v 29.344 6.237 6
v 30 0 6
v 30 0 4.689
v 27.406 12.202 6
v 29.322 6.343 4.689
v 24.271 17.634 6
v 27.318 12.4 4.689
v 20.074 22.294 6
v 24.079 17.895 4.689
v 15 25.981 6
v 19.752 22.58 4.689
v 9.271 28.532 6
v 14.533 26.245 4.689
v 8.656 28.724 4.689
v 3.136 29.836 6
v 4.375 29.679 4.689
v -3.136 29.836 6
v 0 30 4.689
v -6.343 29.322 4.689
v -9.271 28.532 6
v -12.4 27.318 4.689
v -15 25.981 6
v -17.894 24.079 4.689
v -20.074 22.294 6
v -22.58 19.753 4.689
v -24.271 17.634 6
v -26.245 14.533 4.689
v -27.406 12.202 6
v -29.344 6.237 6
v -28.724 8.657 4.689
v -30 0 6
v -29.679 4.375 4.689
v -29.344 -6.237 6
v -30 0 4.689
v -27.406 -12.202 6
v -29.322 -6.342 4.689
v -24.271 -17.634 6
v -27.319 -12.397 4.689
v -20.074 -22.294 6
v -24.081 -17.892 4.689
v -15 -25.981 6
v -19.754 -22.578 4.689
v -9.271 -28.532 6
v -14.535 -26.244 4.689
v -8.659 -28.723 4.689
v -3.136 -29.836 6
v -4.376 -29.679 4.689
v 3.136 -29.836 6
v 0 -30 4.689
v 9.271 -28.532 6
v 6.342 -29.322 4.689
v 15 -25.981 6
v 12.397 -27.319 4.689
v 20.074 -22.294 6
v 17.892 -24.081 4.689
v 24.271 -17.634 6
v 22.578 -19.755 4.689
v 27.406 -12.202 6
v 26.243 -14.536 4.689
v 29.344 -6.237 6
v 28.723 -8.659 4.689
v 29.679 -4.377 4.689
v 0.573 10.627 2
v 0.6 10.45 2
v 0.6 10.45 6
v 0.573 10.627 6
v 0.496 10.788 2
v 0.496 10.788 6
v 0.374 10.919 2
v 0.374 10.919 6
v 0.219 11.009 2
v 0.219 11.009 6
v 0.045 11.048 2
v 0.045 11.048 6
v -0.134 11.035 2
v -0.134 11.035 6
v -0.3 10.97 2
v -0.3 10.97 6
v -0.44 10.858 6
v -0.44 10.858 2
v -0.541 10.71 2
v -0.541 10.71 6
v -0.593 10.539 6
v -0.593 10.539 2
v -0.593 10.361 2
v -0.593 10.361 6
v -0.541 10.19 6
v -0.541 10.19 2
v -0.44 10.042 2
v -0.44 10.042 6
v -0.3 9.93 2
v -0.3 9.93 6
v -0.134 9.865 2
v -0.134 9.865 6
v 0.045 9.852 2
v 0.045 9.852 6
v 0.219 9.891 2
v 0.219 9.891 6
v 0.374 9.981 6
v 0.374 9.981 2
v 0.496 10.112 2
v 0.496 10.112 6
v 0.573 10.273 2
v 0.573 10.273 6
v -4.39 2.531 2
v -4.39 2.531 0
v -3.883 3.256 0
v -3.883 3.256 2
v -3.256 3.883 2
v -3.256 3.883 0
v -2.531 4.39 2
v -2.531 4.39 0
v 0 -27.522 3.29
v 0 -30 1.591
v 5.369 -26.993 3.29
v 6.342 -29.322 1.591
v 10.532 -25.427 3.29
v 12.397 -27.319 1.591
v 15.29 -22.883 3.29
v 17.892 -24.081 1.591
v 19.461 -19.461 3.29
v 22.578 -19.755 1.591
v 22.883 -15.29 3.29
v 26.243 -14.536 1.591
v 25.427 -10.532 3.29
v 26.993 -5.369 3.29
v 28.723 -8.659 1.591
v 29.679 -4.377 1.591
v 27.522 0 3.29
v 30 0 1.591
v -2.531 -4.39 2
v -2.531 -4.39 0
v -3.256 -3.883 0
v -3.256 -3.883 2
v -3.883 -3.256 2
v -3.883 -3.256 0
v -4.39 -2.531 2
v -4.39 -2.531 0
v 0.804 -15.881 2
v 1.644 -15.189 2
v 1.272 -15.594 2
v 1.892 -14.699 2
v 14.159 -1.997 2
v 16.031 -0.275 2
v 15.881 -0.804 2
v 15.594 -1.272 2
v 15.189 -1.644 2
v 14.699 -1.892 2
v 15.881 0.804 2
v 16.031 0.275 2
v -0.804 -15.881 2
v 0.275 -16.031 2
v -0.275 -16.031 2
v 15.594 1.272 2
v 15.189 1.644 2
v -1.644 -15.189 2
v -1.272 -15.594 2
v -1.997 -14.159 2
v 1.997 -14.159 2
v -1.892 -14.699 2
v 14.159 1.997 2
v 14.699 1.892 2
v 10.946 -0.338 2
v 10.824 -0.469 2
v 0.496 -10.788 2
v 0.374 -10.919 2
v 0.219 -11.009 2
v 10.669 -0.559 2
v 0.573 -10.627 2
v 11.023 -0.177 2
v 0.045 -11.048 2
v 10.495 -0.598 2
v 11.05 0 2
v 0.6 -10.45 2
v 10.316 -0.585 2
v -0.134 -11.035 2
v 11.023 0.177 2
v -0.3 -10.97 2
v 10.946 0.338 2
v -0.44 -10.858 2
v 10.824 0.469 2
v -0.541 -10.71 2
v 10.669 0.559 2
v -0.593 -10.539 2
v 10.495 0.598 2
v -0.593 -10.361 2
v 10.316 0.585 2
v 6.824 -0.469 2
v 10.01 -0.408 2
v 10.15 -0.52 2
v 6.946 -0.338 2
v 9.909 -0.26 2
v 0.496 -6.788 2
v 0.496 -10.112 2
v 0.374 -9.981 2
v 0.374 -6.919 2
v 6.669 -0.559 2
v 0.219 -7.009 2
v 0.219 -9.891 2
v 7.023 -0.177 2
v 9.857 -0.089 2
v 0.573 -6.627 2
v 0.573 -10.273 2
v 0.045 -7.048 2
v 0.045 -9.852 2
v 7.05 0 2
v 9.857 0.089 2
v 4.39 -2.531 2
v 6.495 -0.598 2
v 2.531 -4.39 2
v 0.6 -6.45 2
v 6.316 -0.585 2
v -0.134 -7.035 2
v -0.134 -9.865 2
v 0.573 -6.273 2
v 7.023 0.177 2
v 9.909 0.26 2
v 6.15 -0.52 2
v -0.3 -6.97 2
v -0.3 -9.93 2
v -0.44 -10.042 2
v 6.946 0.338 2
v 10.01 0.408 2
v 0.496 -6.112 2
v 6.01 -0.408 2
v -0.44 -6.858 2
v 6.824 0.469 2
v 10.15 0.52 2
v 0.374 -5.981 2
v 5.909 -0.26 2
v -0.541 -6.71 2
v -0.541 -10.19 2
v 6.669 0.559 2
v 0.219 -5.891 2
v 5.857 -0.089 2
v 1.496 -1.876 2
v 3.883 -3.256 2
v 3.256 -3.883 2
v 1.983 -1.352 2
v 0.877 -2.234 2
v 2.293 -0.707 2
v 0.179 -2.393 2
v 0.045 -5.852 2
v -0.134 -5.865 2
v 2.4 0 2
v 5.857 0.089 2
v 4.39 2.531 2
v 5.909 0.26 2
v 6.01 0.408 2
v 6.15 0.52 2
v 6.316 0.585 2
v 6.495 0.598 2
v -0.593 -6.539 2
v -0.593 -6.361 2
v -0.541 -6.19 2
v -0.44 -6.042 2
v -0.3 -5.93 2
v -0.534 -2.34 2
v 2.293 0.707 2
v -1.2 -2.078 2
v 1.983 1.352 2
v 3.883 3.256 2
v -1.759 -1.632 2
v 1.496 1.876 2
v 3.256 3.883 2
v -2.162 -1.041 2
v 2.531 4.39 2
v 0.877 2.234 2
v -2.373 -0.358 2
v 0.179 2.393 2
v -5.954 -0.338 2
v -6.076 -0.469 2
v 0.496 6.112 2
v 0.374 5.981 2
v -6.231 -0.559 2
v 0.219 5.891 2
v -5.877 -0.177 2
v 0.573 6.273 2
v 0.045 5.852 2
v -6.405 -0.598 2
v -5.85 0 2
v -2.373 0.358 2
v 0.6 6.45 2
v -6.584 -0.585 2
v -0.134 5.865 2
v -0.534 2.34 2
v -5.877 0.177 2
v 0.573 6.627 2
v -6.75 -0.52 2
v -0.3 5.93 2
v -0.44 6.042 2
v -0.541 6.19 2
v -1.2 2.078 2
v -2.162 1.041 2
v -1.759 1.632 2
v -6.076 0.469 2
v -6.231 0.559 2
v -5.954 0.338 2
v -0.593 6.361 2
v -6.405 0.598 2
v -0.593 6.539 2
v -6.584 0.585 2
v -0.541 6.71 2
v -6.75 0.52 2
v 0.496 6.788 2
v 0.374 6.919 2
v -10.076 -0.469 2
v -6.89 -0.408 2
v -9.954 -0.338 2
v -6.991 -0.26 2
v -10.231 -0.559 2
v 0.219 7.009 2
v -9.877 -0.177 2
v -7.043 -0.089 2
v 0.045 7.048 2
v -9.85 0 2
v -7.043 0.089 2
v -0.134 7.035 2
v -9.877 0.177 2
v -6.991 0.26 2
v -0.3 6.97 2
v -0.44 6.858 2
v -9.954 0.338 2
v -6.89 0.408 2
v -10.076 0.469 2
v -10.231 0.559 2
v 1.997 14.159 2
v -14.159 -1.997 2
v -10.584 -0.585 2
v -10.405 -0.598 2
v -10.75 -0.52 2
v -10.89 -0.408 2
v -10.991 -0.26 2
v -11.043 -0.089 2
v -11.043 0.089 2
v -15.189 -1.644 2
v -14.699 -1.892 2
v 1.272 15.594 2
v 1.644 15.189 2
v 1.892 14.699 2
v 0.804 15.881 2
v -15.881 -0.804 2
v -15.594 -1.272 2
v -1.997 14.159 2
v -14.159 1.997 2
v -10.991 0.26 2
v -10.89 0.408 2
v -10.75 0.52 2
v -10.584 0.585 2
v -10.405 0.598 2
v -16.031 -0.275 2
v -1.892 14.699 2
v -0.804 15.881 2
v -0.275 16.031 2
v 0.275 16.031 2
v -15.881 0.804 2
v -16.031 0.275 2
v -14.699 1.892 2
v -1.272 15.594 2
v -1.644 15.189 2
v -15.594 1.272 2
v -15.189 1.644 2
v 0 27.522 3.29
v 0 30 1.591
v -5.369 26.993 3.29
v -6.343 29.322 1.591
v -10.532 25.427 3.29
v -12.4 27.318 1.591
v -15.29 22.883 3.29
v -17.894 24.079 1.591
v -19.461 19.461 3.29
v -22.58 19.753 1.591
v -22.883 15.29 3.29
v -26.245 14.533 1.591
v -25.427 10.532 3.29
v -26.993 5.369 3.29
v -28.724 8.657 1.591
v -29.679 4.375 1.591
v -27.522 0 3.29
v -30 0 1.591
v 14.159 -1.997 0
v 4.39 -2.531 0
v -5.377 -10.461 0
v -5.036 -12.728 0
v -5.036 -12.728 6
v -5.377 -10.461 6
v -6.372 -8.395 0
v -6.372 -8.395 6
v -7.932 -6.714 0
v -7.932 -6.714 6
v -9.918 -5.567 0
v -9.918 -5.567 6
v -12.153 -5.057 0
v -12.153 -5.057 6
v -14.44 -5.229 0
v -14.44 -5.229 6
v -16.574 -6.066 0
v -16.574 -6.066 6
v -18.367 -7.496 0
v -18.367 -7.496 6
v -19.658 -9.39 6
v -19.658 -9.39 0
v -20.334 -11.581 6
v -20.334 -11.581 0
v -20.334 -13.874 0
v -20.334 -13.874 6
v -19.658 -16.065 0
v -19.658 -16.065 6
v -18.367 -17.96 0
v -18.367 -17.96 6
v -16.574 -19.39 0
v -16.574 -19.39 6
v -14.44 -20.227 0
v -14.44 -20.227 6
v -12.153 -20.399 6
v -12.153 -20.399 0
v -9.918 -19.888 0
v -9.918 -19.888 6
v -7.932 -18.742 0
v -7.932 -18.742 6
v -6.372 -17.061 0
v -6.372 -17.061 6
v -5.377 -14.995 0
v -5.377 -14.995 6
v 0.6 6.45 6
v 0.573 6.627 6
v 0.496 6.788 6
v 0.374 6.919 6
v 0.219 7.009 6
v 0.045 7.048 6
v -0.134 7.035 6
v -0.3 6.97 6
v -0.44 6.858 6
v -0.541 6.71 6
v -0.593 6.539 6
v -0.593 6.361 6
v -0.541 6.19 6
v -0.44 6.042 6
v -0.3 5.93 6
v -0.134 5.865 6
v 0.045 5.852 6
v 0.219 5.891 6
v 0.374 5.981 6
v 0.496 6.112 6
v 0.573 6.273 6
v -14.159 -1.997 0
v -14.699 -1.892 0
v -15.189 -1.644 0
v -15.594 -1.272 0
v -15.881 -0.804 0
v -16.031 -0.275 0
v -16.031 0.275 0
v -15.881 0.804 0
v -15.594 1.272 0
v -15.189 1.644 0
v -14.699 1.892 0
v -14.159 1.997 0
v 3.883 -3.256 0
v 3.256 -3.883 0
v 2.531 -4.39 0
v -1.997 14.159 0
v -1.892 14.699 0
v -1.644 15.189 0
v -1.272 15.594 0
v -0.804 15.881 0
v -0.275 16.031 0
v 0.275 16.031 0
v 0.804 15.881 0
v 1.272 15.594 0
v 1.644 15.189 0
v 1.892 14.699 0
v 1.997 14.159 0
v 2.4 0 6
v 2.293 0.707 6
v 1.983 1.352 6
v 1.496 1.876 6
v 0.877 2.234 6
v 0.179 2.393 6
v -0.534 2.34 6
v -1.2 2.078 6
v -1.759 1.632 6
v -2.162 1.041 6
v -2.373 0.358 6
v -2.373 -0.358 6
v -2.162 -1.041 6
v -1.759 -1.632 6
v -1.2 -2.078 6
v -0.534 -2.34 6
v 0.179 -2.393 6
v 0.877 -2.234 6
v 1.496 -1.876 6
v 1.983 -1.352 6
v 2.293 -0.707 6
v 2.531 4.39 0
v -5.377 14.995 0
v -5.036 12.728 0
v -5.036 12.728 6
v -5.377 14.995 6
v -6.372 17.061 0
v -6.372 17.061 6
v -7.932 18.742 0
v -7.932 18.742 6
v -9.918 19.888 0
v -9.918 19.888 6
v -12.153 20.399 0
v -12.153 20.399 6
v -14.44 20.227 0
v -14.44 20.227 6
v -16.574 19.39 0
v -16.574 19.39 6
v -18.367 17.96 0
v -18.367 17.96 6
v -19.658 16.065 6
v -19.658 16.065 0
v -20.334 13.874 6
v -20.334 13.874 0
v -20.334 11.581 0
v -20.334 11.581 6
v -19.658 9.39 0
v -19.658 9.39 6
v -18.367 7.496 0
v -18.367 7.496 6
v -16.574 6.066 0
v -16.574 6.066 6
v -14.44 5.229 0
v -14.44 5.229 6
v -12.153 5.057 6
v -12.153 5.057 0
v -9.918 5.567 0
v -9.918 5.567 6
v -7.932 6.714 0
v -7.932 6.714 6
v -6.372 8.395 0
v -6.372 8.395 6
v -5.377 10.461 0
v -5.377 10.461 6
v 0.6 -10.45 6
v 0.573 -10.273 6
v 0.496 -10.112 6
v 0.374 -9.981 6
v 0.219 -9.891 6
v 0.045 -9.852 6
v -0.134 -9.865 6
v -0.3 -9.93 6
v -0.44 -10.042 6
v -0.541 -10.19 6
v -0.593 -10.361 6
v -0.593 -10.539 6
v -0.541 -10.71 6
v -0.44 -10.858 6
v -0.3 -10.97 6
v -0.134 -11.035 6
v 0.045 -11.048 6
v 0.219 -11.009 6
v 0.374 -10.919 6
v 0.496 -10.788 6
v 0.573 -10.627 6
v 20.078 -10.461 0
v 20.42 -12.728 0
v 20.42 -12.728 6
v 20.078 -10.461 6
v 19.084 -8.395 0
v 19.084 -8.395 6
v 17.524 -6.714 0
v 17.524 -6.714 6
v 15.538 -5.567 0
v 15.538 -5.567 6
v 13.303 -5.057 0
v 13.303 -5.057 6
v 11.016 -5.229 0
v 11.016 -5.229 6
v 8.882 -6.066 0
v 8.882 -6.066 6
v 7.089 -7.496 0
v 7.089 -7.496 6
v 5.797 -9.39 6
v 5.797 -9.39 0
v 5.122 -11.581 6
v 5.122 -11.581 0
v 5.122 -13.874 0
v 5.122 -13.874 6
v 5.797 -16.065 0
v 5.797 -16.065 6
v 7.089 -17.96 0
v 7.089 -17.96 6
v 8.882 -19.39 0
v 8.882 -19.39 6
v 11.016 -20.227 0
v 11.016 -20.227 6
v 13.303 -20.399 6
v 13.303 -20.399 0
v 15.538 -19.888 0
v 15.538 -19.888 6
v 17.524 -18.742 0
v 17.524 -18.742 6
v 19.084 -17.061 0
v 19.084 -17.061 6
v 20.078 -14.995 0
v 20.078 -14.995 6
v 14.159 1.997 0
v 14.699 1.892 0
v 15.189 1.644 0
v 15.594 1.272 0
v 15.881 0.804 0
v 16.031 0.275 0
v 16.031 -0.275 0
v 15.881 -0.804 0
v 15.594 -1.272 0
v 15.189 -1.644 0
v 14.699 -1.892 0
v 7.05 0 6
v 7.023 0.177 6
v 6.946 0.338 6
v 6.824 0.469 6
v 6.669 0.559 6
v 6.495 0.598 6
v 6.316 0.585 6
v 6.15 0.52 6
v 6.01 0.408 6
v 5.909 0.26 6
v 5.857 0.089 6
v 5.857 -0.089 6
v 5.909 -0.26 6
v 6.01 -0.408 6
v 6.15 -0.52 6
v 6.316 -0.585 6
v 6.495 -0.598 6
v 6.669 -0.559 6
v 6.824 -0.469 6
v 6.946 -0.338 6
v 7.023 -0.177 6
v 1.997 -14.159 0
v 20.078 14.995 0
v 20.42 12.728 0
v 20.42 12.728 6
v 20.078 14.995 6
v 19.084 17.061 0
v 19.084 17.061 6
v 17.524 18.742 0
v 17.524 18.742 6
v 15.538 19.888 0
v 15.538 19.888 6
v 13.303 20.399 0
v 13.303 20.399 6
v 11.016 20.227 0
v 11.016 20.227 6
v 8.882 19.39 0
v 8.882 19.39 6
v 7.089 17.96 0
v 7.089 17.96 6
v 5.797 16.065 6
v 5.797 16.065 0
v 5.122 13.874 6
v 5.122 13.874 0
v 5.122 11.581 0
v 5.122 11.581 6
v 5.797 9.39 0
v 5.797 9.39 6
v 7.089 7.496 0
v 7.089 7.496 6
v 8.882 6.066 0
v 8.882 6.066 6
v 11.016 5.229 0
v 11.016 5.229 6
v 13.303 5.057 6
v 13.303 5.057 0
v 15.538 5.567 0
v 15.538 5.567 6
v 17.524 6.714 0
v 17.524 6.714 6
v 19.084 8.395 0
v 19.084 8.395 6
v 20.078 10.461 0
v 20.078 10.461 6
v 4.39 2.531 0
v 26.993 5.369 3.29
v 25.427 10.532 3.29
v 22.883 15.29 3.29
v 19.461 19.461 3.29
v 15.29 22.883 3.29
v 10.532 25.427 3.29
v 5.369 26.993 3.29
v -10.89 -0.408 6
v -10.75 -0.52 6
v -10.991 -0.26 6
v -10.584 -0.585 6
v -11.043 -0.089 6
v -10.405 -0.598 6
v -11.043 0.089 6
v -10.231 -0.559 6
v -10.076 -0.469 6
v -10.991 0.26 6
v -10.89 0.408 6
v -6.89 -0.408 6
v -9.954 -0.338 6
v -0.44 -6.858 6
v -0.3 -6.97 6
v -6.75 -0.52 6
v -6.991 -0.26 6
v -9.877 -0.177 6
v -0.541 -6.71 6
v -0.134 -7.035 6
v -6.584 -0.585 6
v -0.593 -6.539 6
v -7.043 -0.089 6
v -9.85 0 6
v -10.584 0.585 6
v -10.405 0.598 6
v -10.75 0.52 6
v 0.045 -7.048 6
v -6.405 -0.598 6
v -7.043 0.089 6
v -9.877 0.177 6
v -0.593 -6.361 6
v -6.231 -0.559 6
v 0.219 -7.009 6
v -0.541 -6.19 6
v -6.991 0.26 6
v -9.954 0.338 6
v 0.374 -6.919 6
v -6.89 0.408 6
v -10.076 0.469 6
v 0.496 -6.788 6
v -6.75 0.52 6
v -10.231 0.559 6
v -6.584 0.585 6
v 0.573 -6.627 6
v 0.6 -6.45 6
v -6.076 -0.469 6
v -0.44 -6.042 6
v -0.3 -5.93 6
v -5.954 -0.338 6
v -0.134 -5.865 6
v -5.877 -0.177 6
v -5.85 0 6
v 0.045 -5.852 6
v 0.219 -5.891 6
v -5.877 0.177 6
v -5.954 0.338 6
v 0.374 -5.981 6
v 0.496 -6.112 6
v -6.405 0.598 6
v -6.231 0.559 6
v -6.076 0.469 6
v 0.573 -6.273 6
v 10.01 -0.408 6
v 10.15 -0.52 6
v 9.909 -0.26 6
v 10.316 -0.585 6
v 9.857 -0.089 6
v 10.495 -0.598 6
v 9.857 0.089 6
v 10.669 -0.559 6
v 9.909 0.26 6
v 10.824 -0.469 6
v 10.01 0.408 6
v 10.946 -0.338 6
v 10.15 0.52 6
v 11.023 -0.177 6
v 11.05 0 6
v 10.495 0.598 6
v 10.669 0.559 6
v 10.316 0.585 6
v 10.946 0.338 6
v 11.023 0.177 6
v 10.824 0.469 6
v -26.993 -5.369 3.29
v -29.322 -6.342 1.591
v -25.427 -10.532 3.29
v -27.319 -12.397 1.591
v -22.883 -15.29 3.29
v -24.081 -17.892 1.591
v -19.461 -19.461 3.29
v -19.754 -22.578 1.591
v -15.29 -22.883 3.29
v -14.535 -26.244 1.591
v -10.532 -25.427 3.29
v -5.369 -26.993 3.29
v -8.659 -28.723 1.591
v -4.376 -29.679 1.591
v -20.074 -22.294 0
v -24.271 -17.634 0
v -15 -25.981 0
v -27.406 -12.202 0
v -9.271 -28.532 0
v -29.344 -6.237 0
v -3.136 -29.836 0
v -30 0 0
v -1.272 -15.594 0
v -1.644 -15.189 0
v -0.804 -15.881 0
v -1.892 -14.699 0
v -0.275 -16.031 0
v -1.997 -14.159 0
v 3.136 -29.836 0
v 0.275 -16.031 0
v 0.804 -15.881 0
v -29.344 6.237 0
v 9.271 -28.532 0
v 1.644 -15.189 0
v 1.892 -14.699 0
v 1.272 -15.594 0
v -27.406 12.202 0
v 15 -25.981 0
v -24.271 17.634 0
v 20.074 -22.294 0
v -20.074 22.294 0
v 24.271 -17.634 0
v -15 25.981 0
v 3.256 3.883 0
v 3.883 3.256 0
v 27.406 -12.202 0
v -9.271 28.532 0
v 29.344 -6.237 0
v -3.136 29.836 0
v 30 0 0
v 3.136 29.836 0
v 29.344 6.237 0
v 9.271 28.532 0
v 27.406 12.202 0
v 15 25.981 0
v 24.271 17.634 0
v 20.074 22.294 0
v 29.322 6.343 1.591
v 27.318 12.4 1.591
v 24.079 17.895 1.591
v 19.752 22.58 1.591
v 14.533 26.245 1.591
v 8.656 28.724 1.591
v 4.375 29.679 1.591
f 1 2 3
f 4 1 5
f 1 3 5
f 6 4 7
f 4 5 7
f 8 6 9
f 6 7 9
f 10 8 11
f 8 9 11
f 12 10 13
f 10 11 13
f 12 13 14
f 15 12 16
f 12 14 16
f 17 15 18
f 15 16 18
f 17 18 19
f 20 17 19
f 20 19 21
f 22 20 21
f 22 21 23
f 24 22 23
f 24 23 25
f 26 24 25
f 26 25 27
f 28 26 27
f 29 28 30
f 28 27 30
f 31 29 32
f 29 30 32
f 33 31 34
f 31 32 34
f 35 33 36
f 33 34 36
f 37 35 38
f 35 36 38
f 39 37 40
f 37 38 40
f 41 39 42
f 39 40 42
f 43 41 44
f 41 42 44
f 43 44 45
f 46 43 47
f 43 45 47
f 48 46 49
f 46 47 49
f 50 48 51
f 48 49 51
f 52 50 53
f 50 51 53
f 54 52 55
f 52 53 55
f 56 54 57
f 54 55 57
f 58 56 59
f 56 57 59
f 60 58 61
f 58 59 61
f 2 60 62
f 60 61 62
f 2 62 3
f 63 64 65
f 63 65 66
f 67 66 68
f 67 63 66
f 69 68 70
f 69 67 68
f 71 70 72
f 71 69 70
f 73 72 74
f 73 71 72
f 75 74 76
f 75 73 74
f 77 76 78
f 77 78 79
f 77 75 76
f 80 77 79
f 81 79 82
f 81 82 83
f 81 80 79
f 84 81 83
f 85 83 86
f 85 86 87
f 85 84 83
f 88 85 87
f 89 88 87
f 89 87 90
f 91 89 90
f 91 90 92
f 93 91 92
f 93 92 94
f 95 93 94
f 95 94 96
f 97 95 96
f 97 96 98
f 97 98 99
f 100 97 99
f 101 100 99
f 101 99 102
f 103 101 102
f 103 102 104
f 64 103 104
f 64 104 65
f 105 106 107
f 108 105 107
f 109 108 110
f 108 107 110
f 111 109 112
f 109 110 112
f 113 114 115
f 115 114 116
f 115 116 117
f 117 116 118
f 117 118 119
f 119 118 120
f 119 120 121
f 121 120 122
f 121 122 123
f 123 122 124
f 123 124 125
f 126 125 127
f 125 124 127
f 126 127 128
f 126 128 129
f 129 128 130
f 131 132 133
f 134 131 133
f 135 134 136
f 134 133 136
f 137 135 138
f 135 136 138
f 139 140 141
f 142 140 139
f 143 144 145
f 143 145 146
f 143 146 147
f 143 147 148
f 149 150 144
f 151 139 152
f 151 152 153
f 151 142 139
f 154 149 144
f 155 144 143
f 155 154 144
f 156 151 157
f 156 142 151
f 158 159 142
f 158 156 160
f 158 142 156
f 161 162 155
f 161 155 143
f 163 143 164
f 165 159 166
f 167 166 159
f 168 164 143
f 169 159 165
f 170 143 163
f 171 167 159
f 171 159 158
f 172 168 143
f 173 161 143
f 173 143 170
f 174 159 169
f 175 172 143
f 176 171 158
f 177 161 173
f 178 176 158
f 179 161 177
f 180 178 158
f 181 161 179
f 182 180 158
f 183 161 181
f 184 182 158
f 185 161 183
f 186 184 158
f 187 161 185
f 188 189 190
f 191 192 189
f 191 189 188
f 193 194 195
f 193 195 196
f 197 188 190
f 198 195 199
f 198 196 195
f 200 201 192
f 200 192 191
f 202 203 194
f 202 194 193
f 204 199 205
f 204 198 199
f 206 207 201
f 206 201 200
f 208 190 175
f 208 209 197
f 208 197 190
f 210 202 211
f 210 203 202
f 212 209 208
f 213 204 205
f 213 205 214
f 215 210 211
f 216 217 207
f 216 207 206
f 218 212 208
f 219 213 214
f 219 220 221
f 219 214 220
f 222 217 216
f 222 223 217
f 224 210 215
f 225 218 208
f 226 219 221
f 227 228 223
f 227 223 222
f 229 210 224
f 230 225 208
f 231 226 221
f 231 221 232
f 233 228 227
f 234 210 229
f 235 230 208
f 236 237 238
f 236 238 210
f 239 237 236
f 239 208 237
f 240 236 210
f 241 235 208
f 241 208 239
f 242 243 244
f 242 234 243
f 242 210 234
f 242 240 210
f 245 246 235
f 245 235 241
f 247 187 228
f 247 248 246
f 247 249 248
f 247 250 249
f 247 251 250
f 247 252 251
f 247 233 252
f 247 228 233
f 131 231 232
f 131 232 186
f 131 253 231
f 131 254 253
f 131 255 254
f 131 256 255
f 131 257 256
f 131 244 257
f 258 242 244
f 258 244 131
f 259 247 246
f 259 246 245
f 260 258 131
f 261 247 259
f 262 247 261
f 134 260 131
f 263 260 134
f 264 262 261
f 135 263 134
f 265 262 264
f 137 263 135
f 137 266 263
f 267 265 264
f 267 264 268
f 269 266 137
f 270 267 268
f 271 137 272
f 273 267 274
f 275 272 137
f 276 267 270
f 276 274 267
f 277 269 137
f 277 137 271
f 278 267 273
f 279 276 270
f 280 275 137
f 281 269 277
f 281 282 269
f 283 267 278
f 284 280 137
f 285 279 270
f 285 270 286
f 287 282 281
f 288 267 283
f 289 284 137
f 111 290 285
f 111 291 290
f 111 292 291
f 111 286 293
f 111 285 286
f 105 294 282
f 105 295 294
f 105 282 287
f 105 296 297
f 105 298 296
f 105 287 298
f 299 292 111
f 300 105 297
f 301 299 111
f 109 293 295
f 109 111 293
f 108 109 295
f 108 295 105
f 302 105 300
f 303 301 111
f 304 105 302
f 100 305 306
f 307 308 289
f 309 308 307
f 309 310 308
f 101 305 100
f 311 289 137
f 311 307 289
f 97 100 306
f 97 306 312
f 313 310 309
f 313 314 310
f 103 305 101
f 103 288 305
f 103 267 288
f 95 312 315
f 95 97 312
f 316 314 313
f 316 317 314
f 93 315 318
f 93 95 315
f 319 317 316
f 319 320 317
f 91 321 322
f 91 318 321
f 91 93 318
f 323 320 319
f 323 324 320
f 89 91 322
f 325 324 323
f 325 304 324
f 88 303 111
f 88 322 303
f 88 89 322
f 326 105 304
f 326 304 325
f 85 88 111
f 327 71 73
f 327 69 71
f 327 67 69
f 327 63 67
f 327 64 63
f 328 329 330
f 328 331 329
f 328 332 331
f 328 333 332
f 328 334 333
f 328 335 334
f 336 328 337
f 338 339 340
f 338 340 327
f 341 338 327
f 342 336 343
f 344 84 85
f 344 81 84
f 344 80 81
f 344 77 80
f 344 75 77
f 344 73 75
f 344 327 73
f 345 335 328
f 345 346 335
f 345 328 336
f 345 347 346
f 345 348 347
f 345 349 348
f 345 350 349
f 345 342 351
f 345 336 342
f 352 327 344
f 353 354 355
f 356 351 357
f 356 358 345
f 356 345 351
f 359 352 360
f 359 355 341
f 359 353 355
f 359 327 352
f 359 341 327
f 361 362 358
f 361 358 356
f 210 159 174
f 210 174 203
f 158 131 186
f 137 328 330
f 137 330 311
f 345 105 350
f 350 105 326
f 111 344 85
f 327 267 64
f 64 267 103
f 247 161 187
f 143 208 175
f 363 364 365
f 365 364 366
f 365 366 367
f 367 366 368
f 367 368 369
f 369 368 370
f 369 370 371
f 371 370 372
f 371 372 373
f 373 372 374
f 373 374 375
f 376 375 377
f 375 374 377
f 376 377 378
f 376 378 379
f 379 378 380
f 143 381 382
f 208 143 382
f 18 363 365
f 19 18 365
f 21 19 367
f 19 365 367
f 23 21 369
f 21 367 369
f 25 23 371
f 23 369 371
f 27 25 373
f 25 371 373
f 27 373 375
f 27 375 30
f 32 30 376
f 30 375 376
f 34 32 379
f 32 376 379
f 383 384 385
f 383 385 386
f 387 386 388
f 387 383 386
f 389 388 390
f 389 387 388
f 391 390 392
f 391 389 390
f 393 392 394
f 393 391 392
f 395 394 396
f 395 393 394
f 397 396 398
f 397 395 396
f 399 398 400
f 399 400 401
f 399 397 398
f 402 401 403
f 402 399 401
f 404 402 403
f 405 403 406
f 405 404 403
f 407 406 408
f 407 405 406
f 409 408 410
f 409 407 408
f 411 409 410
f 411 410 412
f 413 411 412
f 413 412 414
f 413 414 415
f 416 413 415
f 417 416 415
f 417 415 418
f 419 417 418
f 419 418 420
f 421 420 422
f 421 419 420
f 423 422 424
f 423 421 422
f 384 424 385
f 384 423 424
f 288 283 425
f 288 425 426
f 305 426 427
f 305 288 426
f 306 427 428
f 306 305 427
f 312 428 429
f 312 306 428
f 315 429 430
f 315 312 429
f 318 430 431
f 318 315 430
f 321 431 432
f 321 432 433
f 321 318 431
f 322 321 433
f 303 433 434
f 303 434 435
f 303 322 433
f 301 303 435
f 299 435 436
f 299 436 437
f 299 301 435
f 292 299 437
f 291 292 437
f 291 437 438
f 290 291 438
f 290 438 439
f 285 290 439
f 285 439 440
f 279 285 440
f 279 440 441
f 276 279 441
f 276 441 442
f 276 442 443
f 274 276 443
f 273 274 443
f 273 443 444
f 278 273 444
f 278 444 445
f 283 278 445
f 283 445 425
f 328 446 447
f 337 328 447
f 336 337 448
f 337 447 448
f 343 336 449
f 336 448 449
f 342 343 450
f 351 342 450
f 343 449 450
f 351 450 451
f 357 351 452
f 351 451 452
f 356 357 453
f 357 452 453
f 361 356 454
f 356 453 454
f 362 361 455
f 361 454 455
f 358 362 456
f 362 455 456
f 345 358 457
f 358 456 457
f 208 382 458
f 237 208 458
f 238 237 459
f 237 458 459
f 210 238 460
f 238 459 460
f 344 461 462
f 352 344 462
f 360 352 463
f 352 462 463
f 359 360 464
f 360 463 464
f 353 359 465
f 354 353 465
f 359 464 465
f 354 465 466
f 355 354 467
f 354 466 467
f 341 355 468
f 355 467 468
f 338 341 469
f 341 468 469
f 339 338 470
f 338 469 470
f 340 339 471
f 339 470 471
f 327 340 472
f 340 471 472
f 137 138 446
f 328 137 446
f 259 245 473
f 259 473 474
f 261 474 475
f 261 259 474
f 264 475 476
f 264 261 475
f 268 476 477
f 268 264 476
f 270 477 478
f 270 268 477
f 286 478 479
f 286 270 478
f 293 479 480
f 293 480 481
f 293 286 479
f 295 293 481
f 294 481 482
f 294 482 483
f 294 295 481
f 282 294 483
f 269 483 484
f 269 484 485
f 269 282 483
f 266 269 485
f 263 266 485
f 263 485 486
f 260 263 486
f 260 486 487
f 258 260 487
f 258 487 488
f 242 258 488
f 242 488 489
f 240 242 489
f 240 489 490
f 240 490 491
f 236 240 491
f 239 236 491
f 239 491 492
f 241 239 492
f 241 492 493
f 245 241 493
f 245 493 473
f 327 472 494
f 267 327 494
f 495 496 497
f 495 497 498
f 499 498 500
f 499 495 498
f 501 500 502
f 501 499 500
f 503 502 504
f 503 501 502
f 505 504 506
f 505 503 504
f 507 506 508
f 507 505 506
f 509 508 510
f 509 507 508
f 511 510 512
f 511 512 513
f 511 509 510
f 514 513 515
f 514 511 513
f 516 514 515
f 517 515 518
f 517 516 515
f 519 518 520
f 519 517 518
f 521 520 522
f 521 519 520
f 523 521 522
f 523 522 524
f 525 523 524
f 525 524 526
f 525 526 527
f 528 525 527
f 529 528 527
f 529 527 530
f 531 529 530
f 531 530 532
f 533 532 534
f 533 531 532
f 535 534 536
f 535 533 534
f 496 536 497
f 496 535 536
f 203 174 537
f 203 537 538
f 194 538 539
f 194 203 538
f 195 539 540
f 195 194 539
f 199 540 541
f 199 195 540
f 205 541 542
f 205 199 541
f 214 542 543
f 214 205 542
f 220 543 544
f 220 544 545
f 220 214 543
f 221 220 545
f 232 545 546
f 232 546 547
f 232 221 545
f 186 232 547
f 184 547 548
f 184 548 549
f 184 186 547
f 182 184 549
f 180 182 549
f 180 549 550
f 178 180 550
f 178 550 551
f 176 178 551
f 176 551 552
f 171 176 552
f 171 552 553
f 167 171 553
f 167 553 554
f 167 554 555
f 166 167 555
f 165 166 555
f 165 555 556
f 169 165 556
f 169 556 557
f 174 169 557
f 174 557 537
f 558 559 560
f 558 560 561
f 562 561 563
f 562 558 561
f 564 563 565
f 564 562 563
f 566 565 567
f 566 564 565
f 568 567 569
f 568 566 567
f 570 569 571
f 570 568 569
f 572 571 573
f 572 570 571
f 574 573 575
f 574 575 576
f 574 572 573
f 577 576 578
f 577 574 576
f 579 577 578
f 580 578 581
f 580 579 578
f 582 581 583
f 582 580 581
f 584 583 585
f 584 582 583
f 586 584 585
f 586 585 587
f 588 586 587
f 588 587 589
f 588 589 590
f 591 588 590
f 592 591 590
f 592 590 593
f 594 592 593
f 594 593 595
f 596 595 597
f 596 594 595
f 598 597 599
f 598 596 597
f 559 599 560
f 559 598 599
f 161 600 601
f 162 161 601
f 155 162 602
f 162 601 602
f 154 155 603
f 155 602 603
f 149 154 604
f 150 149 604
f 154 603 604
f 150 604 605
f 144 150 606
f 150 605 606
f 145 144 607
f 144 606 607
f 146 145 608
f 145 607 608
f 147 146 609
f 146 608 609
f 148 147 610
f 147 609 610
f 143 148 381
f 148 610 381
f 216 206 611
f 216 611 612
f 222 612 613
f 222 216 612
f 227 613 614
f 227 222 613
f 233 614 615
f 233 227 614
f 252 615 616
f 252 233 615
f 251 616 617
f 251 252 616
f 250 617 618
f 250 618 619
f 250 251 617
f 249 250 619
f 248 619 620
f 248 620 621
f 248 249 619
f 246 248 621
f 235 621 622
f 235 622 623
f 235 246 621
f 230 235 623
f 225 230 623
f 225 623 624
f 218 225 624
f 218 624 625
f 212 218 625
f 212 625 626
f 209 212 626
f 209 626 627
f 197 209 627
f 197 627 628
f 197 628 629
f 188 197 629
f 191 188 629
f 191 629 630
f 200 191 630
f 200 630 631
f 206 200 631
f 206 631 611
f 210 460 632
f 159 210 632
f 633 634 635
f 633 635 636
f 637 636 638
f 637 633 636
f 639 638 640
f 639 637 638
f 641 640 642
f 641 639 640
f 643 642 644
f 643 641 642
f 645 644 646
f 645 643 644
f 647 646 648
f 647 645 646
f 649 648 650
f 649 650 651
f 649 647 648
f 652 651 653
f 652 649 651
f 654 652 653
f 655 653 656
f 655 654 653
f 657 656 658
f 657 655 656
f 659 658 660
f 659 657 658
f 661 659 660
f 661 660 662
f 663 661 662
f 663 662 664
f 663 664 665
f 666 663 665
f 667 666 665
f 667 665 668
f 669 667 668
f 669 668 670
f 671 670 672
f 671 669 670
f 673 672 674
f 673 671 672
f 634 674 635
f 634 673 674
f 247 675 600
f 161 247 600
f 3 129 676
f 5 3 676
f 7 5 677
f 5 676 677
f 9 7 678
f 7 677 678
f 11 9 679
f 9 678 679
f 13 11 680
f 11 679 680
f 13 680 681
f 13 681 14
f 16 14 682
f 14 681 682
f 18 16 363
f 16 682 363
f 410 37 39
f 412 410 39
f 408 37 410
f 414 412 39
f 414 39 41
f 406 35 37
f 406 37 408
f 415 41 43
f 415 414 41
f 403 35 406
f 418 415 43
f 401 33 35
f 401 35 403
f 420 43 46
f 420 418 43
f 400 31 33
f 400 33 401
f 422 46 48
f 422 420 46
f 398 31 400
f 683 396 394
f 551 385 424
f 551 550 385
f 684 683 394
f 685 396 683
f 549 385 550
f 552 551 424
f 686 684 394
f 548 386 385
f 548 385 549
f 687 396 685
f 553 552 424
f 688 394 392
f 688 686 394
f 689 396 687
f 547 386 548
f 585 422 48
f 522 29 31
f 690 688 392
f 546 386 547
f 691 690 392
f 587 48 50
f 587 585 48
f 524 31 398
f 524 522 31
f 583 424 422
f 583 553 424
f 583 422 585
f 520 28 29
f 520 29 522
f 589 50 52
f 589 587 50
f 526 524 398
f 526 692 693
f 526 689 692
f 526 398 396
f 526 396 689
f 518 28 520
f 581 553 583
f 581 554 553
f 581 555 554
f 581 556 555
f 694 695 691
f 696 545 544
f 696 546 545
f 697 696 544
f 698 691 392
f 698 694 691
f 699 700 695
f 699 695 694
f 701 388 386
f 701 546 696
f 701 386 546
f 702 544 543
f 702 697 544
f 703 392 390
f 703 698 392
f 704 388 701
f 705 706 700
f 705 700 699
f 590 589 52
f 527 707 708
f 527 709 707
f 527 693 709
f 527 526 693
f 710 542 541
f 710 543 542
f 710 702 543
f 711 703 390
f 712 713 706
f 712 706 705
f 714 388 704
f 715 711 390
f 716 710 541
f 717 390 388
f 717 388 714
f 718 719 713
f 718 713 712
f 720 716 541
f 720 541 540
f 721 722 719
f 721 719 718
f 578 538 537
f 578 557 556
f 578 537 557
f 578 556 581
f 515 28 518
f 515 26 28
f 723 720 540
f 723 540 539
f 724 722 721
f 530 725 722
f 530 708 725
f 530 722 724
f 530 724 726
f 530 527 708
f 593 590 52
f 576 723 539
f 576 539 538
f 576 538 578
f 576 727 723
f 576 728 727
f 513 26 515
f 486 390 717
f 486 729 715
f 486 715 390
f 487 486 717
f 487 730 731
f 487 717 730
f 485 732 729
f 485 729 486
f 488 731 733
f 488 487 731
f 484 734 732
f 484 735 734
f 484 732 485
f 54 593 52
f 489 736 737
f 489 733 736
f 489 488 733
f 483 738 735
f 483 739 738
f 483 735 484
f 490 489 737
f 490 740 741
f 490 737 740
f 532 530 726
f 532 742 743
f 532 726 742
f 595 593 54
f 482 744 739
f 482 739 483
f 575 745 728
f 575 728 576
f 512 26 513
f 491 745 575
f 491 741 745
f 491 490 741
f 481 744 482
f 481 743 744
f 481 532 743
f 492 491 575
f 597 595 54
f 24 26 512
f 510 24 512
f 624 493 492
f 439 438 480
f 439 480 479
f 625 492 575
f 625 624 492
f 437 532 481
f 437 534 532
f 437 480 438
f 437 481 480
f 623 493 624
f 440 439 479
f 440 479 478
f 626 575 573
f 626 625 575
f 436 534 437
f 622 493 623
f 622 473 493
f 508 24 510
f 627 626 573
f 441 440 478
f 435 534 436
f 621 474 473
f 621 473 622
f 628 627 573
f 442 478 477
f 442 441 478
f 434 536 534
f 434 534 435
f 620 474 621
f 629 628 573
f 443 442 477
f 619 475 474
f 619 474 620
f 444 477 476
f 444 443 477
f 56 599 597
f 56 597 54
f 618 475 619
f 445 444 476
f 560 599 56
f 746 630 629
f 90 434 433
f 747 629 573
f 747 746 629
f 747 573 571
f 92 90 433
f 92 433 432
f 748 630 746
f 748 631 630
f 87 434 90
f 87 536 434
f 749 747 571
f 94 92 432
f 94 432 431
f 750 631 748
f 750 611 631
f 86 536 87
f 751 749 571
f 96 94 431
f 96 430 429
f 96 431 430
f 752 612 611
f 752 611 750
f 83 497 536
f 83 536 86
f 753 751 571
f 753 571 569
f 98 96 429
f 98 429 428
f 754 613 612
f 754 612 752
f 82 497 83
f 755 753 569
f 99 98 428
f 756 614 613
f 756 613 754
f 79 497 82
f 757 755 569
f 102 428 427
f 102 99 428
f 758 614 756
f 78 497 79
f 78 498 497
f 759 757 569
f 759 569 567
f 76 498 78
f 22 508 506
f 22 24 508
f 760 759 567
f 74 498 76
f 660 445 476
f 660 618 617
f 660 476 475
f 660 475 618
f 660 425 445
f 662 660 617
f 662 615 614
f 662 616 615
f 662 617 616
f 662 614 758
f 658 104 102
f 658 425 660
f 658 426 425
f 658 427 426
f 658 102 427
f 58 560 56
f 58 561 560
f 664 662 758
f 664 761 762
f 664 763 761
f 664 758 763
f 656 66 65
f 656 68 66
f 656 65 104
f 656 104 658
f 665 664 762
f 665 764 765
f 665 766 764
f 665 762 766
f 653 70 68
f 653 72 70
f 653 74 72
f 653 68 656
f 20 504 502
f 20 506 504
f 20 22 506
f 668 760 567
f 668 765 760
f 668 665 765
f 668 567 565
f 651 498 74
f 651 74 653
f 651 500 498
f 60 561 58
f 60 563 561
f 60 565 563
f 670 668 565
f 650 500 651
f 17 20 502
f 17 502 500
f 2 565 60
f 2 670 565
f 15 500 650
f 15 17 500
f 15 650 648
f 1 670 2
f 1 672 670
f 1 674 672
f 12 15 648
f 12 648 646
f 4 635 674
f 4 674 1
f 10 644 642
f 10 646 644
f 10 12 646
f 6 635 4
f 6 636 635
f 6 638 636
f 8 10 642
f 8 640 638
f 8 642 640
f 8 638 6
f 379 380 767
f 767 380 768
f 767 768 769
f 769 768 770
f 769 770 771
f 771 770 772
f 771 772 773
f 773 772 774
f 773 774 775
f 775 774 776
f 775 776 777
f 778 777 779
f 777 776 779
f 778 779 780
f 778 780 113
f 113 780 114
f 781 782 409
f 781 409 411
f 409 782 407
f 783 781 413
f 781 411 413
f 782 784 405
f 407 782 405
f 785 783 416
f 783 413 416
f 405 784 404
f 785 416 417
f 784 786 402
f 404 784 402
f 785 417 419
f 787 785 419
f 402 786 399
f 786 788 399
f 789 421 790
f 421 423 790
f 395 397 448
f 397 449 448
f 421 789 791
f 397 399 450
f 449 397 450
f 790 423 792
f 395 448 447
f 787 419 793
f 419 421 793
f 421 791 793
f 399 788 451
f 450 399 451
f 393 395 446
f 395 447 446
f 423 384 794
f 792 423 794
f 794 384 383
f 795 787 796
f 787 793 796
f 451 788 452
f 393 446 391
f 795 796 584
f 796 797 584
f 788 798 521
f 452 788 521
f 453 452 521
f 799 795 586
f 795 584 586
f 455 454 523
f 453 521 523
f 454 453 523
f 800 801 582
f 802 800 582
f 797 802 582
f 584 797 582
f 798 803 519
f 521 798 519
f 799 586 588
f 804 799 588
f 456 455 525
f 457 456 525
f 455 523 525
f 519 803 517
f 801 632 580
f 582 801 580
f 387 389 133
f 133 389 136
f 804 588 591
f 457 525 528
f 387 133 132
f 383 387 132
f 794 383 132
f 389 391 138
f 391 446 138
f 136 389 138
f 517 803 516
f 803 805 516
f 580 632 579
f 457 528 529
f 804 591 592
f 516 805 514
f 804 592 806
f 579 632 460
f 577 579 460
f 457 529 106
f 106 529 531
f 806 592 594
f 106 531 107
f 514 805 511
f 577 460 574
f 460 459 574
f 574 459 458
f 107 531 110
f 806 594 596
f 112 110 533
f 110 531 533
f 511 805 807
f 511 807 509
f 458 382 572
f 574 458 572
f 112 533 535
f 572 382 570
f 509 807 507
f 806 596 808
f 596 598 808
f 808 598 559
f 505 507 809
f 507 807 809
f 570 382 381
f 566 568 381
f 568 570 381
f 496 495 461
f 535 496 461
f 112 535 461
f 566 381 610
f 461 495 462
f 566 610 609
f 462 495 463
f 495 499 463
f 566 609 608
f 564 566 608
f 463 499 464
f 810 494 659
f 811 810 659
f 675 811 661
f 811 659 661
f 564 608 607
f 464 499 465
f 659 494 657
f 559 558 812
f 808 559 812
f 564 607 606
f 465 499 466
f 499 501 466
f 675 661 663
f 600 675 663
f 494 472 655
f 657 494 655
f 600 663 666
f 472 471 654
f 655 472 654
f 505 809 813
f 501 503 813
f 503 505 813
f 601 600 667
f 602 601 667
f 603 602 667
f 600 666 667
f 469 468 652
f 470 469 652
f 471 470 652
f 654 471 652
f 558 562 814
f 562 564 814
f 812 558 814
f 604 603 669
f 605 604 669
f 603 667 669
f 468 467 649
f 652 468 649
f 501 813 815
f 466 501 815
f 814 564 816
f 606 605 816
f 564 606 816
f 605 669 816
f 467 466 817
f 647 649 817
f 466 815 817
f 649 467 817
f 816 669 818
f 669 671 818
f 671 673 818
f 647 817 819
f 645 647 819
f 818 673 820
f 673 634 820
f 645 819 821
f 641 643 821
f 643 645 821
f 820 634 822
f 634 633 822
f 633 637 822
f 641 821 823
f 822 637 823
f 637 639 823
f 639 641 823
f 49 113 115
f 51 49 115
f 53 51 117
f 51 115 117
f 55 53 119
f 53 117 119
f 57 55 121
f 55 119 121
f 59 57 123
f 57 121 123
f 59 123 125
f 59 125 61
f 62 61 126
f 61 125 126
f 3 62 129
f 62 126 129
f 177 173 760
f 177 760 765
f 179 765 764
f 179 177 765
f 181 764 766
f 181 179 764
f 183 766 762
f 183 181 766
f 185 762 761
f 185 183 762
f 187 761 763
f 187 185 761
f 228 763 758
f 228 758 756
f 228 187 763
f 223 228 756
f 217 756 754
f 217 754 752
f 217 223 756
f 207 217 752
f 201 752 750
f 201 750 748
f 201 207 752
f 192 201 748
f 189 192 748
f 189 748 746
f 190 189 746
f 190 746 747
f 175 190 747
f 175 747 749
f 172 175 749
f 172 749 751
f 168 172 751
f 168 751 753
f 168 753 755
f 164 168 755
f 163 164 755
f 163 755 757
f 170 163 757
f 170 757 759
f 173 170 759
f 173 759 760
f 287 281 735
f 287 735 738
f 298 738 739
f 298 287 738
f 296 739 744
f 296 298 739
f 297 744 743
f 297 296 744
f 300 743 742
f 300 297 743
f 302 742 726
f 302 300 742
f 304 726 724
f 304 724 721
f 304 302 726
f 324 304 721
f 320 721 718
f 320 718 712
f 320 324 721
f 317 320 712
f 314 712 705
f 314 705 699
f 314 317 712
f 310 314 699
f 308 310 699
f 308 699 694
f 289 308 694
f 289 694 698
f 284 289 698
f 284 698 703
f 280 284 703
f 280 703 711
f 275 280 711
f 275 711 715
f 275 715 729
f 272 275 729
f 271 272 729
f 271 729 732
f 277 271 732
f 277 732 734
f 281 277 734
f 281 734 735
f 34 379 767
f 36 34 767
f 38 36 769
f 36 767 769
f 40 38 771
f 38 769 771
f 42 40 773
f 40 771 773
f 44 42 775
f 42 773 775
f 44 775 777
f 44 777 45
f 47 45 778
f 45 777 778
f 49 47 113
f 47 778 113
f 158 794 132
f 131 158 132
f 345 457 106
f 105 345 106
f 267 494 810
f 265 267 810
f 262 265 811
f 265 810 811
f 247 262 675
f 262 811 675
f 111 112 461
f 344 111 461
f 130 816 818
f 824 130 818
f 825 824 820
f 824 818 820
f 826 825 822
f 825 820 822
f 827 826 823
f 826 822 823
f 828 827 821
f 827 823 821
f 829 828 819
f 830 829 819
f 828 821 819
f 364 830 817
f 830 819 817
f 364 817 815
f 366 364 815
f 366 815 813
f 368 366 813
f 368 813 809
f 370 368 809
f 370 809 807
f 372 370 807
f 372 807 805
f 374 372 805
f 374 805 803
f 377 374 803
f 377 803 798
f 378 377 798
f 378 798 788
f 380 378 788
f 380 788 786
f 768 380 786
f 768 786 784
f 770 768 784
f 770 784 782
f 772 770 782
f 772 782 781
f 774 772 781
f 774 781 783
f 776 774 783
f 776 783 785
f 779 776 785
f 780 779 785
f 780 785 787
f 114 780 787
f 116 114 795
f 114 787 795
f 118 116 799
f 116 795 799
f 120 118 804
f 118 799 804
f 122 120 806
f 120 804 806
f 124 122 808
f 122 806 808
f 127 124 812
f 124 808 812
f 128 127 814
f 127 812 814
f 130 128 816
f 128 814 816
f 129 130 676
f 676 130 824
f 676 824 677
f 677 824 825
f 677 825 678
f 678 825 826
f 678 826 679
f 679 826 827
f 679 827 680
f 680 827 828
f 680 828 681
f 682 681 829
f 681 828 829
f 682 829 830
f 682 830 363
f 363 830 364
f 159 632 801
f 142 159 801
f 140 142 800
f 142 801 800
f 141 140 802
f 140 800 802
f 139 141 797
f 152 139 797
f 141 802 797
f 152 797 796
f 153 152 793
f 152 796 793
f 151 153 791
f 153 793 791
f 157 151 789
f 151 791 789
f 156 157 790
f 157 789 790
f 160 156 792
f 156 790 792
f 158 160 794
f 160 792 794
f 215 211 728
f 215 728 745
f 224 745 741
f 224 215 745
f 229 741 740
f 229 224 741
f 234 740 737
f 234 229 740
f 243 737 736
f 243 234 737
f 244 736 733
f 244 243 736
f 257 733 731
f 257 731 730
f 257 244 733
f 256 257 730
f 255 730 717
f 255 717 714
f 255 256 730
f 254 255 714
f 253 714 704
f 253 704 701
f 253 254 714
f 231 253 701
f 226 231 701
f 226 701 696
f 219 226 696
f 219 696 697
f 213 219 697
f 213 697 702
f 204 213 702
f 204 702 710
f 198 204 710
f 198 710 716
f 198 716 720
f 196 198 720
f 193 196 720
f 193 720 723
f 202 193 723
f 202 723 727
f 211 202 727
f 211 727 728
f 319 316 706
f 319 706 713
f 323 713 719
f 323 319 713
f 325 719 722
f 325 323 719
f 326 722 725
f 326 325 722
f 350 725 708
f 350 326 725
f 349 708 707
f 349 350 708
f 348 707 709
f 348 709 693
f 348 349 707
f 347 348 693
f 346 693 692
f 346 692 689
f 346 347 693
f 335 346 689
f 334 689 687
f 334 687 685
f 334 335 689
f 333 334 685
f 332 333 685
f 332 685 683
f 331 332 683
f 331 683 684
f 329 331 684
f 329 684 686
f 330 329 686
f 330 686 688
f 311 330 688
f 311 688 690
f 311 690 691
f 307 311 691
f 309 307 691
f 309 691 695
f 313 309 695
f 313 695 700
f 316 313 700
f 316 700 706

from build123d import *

# Parameters (mm, degrees)
ESQUISSE2_R             = 30
ESQUISSE2_R_2           = 0.6
ESQUISSE2_R_3           = 2.4
ESQUISSE2_R_4           = 7.692251906
BOSS_EXTRU_1_DEPTH      = 6
ENL_V_MAT_EXTRU_1_DEPTH = 2


with BuildPart() as part:
    # Esquisse2 → Boss.-Extru.1 (new body)
    with BuildSketch(Plane.XY):
        Circle(ESQUISSE2_R)
        with Locations((0, 10.45)):
            Circle(ESQUISSE2_R_2, mode=Mode.SUBTRACT)
        with Locations((0, 6.45)):
            Circle(ESQUISSE2_R_2, mode=Mode.SUBTRACT)
        Circle(ESQUISSE2_R_3, mode=Mode.SUBTRACT)
        with Locations((10.45, 0)):
            Circle(ESQUISSE2_R_2, mode=Mode.SUBTRACT)
        with Locations((6.45, 0)):
            Circle(ESQUISSE2_R_2, mode=Mode.SUBTRACT)
        with Locations((0, -10.45)):
            Circle(ESQUISSE2_R_2, mode=Mode.SUBTRACT)
        with Locations((0, -6.45)):
            Circle(ESQUISSE2_R_2, mode=Mode.SUBTRACT)
        with Locations((-10.45, 0)):
            Circle(ESQUISSE2_R_2, mode=Mode.SUBTRACT)
        with Locations((-6.45, 0)):
            Circle(ESQUISSE2_R_2, mode=Mode.SUBTRACT)
        with Locations((-12.727922061, 12.727922061)):
            Circle(ESQUISSE2_R_4, mode=Mode.SUBTRACT)
        with Locations((12.727922061, 12.727922061)):
            Circle(ESQUISSE2_R_4, mode=Mode.SUBTRACT)
        with Locations((12.727922061, -12.727922061)):
            Circle(ESQUISSE2_R_4, mode=Mode.SUBTRACT)
        with Locations((-12.727922061, -12.727922061)):
            Circle(ESQUISSE2_R_4, mode=Mode.SUBTRACT)
    extrude(amount=BOSS_EXTRU_1_DEPTH)

    # Esquisse3 → Enlèv. mat.-Extru.1 (cut)
    with BuildSketch(Plane(origin=(0, 0, 0), x_dir=(-1, 0, 0), z_dir=(0, 0, -1))):
        with BuildLine():
            Line((-2.530820261, -4.390158503), (-1.99702088, -14.159121967))
            ThreePointArc((-1.99702088, -14.159121967), (0, -16.05), (1.99702088, -14.159121967))
            Line((1.99702088, -14.159121967), (2.530820261, -4.390158503))
            ThreePointArc((2.530820261, -4.390158503), (3.583192911, -3.583192911), (4.390158503, -2.530820261))
            Line((4.390158503, -2.530820261), (14.159121967, -1.99702088))
            ThreePointArc((14.159121967, -1.99702088), (16.05, 0), (14.159121967, 1.99702088))
            Line((14.159121967, 1.99702088), (4.390158503, 2.530820261))
            ThreePointArc((4.390158503, 2.530820261), (3.583192911, 3.583192911), (2.530820261, 4.390158503))
            Line((2.530820261, 4.390158503), (1.99702088, 14.159121967))
            ThreePointArc((1.99702088, 14.159121967), (0, 16.05), (-1.99702088, 14.159121967))
            Line((-1.99702088, 14.159121967), (-2.530820261, 4.390158503))
            ThreePointArc((-2.530820261, 4.390158503), (-3.583192911, 3.583192911), (-4.390158503, 2.530820261))
            Line((-4.390158503, 2.530820261), (-14.159121967, 1.99702088))
            ThreePointArc((-14.159121967, 1.99702088), (-16.05, 0), (-14.159121967, -1.99702088))
            Line((-14.159121967, -1.99702088), (-4.390158503, -2.530820261))
            ThreePointArc((-4.390158503, -2.530820261), (-3.583192911, -3.583192911), (-2.530820261, -4.390158503))
        make_face()
    extrude(amount=-ENL_V_MAT_EXTRU_1_DEPTH, mode=Mode.SUBTRACT)

    # Enlèvement de matière-Balayage1: sweep along a curve in space
    with BuildLine() as enl_vement_de_mati_re_balayage1_path:
        ThreePointArc((30, 0, 0), (21.213203436, 21.213203436, 0), (0, 30, 0))
        ThreePointArc((0, 30, 0), (-21.213203436, 21.213203436, 0), (-30, 0, 0))
        ThreePointArc((-30, 0, 0), (-21.213203436, -21.213203436, 0), (0, -30, 0))
        ThreePointArc((0, -30, 0), (21.213203436, -21.213203436, 0), (30, 0, 0))
    # Esquisse4 → Enlèvement de matière-Balayage1 (sweep, cut)
    with BuildSketch(Plane(origin=(0, 0, 0), x_dir=(1, 0, 0), z_dir=(0, 1, 0))):
        Polygon((-31.389656083, -5.473341376), (-27.521569936, -3.290275959), (-31.389656083, -0.638208742), align=None)
    sweep(path=enl_vement_de_mati_re_balayage1_path.line, mode=Mode.SUBTRACT)


solid = part.part
